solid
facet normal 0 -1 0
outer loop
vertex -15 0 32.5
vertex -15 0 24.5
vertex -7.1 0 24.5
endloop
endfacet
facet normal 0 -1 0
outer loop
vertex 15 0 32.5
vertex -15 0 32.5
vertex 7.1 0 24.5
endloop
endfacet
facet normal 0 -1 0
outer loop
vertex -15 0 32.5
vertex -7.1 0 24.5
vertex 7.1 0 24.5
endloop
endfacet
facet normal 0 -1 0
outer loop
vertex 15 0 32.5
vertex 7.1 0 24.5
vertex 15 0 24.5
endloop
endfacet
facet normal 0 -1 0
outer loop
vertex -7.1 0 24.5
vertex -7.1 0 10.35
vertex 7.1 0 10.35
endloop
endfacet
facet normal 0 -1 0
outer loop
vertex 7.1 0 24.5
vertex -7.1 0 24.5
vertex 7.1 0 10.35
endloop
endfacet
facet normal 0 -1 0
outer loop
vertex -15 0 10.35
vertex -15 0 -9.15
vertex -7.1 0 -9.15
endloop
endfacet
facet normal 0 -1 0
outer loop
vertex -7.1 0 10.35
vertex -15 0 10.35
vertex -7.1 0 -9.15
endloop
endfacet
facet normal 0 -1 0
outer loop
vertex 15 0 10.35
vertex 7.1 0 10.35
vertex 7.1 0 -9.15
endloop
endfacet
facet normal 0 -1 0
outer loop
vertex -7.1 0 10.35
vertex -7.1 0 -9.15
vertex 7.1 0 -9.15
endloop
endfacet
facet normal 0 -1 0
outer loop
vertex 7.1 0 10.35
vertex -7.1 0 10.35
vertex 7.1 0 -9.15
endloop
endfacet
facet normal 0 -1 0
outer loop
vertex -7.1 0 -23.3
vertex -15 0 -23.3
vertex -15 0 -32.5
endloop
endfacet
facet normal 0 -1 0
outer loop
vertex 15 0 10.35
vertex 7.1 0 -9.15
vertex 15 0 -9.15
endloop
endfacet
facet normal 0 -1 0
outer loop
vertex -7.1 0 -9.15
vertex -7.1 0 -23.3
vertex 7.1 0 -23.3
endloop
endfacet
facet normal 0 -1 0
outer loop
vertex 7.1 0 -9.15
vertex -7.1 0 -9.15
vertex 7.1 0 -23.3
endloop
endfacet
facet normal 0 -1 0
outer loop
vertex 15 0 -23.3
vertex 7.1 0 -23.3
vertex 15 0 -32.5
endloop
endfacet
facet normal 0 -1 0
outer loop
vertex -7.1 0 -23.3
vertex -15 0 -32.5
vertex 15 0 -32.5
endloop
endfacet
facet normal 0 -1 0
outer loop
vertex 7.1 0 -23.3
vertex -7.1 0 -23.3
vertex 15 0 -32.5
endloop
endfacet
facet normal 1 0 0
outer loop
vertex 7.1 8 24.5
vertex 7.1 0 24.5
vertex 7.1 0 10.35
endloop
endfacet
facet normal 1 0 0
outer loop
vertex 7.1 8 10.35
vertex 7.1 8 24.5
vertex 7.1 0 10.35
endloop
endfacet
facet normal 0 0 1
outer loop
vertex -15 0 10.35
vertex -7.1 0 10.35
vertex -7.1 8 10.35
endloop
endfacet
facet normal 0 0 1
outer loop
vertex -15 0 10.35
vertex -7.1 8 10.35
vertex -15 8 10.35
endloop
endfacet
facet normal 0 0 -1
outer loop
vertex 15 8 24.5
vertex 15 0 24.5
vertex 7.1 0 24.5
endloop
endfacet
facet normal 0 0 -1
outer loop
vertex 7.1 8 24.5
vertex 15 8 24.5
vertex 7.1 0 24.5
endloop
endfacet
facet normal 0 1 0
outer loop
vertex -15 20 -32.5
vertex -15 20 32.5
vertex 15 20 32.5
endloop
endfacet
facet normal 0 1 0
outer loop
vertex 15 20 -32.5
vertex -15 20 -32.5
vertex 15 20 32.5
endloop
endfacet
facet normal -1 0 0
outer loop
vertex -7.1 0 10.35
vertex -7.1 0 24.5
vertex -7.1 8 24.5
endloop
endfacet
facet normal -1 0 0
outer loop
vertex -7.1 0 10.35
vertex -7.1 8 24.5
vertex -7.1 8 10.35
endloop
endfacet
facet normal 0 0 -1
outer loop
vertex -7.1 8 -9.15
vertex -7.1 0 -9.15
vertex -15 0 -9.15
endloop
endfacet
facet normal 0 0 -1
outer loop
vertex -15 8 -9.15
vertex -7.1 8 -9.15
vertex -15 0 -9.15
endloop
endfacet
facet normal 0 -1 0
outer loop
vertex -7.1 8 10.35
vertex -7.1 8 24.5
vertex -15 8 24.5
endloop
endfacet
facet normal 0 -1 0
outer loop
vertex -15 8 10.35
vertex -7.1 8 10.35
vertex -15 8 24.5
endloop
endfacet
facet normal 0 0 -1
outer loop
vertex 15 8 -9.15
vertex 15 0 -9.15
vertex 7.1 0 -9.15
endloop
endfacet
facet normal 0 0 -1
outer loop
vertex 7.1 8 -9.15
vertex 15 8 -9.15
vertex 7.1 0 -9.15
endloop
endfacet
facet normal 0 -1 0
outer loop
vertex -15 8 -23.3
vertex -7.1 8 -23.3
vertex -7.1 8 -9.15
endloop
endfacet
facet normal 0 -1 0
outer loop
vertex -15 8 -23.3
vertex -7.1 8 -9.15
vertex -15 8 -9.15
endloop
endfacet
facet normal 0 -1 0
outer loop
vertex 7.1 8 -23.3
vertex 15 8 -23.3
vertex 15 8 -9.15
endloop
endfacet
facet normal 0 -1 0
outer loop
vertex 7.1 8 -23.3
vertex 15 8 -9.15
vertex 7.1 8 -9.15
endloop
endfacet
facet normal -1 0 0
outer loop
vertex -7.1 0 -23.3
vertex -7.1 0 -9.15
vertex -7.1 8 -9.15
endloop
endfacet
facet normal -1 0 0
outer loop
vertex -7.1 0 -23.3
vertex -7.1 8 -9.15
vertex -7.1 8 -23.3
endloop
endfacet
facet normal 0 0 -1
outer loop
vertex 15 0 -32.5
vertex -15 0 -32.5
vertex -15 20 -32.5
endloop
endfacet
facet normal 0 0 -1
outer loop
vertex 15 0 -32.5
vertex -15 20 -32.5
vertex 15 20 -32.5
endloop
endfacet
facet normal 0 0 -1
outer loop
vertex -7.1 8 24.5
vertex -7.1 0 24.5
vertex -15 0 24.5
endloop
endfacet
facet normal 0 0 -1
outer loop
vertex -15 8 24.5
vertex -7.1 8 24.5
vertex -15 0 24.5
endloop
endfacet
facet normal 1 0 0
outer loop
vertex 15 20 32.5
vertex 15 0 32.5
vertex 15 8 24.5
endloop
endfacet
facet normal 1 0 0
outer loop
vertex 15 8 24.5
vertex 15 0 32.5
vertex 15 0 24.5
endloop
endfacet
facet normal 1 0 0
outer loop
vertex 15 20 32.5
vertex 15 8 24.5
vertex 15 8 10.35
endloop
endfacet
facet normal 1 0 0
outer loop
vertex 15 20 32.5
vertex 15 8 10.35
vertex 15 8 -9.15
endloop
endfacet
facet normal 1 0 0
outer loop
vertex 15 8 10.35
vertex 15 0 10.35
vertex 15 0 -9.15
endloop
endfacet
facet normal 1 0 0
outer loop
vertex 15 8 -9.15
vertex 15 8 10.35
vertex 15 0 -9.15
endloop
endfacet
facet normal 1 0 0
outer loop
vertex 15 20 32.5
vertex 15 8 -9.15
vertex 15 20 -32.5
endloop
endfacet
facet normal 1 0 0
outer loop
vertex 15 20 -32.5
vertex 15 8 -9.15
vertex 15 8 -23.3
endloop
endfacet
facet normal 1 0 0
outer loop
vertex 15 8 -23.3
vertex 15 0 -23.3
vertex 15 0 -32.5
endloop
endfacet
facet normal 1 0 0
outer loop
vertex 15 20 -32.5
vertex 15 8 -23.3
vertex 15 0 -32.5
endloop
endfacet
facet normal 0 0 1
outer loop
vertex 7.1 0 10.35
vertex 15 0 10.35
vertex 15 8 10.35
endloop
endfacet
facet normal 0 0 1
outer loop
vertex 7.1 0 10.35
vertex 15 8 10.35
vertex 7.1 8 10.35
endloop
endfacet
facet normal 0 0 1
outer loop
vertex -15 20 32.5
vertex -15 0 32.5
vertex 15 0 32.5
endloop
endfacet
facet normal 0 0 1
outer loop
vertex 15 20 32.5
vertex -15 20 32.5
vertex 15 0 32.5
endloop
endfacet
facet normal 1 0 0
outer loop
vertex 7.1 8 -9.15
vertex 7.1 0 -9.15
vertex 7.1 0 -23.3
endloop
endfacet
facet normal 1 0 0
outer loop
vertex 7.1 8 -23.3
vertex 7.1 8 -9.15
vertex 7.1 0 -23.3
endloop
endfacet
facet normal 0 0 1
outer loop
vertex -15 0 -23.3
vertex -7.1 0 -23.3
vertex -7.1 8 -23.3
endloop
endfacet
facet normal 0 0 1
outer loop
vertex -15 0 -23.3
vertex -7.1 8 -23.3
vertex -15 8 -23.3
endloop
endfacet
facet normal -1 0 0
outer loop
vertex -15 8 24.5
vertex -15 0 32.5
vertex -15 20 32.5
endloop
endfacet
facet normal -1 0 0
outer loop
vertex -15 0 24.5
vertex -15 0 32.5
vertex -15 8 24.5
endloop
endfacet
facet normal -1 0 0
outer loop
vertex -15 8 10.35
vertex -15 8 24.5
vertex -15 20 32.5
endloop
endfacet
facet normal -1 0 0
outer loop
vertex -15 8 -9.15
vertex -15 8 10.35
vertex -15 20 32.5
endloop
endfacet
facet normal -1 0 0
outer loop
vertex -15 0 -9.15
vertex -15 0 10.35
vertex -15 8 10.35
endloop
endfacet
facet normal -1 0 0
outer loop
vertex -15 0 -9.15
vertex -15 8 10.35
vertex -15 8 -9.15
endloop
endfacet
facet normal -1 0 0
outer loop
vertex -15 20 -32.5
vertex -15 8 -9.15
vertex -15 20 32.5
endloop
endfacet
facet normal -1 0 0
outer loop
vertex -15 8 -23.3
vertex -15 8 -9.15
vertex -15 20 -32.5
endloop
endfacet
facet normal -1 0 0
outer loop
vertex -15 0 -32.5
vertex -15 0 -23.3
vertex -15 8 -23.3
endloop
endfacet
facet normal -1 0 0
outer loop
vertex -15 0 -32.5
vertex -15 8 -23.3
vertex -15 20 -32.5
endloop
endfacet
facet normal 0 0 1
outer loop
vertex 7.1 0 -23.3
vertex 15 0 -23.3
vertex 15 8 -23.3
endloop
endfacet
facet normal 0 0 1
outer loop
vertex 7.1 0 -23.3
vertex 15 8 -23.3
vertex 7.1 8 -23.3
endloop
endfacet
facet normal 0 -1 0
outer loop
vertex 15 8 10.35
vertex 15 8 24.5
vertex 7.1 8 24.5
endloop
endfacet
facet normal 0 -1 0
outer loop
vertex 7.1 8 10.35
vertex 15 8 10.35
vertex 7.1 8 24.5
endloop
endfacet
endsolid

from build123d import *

# Parameters (mm, degrees)
SKETCH_4_W          = 30
SKETCH_4_H          = 65
EXTRUDE_1_DEPTH     = 20
SKETCH_5_W          = 7.9
SKETCH_5_H          = 14.15
CUT_EXTRUDE_1_DEPTH = 8


with BuildPart() as part:
    # 草图4 → 凸台-拉伸1 (new body)
    with BuildSketch(Plane(origin=(0, 0, 0), x_dir=(1, 0, 0), z_dir=(0, 1, 0))):
        Rectangle(SKETCH_4_W, SKETCH_4_H)
    extrude(amount=EXTRUDE_1_DEPTH)

    # 草图5 → 切除-拉伸1 (cut)
    with BuildSketch(Plane(origin=(0, 0, 0), x_dir=(-1, 0, 0), z_dir=(0, -1, 0))):
        with Locations((11.05, -17.425)):
            Rectangle(SKETCH_5_W, SKETCH_5_H)
        with Locations((11.05, 16.225)):
            Rectangle(SKETCH_5_W, SKETCH_5_H)
        with Locations((-11.05, 16.225)):
            Rectangle(SKETCH_5_W, SKETCH_5_H)
        with Locations((-11.05, -17.425)):
            Rectangle(SKETCH_5_W, SKETCH_5_H)
    extrude(amount=-CUT_EXTRUDE_1_DEPTH, mode=Mode.SUBTRACT)


solid = part.part
